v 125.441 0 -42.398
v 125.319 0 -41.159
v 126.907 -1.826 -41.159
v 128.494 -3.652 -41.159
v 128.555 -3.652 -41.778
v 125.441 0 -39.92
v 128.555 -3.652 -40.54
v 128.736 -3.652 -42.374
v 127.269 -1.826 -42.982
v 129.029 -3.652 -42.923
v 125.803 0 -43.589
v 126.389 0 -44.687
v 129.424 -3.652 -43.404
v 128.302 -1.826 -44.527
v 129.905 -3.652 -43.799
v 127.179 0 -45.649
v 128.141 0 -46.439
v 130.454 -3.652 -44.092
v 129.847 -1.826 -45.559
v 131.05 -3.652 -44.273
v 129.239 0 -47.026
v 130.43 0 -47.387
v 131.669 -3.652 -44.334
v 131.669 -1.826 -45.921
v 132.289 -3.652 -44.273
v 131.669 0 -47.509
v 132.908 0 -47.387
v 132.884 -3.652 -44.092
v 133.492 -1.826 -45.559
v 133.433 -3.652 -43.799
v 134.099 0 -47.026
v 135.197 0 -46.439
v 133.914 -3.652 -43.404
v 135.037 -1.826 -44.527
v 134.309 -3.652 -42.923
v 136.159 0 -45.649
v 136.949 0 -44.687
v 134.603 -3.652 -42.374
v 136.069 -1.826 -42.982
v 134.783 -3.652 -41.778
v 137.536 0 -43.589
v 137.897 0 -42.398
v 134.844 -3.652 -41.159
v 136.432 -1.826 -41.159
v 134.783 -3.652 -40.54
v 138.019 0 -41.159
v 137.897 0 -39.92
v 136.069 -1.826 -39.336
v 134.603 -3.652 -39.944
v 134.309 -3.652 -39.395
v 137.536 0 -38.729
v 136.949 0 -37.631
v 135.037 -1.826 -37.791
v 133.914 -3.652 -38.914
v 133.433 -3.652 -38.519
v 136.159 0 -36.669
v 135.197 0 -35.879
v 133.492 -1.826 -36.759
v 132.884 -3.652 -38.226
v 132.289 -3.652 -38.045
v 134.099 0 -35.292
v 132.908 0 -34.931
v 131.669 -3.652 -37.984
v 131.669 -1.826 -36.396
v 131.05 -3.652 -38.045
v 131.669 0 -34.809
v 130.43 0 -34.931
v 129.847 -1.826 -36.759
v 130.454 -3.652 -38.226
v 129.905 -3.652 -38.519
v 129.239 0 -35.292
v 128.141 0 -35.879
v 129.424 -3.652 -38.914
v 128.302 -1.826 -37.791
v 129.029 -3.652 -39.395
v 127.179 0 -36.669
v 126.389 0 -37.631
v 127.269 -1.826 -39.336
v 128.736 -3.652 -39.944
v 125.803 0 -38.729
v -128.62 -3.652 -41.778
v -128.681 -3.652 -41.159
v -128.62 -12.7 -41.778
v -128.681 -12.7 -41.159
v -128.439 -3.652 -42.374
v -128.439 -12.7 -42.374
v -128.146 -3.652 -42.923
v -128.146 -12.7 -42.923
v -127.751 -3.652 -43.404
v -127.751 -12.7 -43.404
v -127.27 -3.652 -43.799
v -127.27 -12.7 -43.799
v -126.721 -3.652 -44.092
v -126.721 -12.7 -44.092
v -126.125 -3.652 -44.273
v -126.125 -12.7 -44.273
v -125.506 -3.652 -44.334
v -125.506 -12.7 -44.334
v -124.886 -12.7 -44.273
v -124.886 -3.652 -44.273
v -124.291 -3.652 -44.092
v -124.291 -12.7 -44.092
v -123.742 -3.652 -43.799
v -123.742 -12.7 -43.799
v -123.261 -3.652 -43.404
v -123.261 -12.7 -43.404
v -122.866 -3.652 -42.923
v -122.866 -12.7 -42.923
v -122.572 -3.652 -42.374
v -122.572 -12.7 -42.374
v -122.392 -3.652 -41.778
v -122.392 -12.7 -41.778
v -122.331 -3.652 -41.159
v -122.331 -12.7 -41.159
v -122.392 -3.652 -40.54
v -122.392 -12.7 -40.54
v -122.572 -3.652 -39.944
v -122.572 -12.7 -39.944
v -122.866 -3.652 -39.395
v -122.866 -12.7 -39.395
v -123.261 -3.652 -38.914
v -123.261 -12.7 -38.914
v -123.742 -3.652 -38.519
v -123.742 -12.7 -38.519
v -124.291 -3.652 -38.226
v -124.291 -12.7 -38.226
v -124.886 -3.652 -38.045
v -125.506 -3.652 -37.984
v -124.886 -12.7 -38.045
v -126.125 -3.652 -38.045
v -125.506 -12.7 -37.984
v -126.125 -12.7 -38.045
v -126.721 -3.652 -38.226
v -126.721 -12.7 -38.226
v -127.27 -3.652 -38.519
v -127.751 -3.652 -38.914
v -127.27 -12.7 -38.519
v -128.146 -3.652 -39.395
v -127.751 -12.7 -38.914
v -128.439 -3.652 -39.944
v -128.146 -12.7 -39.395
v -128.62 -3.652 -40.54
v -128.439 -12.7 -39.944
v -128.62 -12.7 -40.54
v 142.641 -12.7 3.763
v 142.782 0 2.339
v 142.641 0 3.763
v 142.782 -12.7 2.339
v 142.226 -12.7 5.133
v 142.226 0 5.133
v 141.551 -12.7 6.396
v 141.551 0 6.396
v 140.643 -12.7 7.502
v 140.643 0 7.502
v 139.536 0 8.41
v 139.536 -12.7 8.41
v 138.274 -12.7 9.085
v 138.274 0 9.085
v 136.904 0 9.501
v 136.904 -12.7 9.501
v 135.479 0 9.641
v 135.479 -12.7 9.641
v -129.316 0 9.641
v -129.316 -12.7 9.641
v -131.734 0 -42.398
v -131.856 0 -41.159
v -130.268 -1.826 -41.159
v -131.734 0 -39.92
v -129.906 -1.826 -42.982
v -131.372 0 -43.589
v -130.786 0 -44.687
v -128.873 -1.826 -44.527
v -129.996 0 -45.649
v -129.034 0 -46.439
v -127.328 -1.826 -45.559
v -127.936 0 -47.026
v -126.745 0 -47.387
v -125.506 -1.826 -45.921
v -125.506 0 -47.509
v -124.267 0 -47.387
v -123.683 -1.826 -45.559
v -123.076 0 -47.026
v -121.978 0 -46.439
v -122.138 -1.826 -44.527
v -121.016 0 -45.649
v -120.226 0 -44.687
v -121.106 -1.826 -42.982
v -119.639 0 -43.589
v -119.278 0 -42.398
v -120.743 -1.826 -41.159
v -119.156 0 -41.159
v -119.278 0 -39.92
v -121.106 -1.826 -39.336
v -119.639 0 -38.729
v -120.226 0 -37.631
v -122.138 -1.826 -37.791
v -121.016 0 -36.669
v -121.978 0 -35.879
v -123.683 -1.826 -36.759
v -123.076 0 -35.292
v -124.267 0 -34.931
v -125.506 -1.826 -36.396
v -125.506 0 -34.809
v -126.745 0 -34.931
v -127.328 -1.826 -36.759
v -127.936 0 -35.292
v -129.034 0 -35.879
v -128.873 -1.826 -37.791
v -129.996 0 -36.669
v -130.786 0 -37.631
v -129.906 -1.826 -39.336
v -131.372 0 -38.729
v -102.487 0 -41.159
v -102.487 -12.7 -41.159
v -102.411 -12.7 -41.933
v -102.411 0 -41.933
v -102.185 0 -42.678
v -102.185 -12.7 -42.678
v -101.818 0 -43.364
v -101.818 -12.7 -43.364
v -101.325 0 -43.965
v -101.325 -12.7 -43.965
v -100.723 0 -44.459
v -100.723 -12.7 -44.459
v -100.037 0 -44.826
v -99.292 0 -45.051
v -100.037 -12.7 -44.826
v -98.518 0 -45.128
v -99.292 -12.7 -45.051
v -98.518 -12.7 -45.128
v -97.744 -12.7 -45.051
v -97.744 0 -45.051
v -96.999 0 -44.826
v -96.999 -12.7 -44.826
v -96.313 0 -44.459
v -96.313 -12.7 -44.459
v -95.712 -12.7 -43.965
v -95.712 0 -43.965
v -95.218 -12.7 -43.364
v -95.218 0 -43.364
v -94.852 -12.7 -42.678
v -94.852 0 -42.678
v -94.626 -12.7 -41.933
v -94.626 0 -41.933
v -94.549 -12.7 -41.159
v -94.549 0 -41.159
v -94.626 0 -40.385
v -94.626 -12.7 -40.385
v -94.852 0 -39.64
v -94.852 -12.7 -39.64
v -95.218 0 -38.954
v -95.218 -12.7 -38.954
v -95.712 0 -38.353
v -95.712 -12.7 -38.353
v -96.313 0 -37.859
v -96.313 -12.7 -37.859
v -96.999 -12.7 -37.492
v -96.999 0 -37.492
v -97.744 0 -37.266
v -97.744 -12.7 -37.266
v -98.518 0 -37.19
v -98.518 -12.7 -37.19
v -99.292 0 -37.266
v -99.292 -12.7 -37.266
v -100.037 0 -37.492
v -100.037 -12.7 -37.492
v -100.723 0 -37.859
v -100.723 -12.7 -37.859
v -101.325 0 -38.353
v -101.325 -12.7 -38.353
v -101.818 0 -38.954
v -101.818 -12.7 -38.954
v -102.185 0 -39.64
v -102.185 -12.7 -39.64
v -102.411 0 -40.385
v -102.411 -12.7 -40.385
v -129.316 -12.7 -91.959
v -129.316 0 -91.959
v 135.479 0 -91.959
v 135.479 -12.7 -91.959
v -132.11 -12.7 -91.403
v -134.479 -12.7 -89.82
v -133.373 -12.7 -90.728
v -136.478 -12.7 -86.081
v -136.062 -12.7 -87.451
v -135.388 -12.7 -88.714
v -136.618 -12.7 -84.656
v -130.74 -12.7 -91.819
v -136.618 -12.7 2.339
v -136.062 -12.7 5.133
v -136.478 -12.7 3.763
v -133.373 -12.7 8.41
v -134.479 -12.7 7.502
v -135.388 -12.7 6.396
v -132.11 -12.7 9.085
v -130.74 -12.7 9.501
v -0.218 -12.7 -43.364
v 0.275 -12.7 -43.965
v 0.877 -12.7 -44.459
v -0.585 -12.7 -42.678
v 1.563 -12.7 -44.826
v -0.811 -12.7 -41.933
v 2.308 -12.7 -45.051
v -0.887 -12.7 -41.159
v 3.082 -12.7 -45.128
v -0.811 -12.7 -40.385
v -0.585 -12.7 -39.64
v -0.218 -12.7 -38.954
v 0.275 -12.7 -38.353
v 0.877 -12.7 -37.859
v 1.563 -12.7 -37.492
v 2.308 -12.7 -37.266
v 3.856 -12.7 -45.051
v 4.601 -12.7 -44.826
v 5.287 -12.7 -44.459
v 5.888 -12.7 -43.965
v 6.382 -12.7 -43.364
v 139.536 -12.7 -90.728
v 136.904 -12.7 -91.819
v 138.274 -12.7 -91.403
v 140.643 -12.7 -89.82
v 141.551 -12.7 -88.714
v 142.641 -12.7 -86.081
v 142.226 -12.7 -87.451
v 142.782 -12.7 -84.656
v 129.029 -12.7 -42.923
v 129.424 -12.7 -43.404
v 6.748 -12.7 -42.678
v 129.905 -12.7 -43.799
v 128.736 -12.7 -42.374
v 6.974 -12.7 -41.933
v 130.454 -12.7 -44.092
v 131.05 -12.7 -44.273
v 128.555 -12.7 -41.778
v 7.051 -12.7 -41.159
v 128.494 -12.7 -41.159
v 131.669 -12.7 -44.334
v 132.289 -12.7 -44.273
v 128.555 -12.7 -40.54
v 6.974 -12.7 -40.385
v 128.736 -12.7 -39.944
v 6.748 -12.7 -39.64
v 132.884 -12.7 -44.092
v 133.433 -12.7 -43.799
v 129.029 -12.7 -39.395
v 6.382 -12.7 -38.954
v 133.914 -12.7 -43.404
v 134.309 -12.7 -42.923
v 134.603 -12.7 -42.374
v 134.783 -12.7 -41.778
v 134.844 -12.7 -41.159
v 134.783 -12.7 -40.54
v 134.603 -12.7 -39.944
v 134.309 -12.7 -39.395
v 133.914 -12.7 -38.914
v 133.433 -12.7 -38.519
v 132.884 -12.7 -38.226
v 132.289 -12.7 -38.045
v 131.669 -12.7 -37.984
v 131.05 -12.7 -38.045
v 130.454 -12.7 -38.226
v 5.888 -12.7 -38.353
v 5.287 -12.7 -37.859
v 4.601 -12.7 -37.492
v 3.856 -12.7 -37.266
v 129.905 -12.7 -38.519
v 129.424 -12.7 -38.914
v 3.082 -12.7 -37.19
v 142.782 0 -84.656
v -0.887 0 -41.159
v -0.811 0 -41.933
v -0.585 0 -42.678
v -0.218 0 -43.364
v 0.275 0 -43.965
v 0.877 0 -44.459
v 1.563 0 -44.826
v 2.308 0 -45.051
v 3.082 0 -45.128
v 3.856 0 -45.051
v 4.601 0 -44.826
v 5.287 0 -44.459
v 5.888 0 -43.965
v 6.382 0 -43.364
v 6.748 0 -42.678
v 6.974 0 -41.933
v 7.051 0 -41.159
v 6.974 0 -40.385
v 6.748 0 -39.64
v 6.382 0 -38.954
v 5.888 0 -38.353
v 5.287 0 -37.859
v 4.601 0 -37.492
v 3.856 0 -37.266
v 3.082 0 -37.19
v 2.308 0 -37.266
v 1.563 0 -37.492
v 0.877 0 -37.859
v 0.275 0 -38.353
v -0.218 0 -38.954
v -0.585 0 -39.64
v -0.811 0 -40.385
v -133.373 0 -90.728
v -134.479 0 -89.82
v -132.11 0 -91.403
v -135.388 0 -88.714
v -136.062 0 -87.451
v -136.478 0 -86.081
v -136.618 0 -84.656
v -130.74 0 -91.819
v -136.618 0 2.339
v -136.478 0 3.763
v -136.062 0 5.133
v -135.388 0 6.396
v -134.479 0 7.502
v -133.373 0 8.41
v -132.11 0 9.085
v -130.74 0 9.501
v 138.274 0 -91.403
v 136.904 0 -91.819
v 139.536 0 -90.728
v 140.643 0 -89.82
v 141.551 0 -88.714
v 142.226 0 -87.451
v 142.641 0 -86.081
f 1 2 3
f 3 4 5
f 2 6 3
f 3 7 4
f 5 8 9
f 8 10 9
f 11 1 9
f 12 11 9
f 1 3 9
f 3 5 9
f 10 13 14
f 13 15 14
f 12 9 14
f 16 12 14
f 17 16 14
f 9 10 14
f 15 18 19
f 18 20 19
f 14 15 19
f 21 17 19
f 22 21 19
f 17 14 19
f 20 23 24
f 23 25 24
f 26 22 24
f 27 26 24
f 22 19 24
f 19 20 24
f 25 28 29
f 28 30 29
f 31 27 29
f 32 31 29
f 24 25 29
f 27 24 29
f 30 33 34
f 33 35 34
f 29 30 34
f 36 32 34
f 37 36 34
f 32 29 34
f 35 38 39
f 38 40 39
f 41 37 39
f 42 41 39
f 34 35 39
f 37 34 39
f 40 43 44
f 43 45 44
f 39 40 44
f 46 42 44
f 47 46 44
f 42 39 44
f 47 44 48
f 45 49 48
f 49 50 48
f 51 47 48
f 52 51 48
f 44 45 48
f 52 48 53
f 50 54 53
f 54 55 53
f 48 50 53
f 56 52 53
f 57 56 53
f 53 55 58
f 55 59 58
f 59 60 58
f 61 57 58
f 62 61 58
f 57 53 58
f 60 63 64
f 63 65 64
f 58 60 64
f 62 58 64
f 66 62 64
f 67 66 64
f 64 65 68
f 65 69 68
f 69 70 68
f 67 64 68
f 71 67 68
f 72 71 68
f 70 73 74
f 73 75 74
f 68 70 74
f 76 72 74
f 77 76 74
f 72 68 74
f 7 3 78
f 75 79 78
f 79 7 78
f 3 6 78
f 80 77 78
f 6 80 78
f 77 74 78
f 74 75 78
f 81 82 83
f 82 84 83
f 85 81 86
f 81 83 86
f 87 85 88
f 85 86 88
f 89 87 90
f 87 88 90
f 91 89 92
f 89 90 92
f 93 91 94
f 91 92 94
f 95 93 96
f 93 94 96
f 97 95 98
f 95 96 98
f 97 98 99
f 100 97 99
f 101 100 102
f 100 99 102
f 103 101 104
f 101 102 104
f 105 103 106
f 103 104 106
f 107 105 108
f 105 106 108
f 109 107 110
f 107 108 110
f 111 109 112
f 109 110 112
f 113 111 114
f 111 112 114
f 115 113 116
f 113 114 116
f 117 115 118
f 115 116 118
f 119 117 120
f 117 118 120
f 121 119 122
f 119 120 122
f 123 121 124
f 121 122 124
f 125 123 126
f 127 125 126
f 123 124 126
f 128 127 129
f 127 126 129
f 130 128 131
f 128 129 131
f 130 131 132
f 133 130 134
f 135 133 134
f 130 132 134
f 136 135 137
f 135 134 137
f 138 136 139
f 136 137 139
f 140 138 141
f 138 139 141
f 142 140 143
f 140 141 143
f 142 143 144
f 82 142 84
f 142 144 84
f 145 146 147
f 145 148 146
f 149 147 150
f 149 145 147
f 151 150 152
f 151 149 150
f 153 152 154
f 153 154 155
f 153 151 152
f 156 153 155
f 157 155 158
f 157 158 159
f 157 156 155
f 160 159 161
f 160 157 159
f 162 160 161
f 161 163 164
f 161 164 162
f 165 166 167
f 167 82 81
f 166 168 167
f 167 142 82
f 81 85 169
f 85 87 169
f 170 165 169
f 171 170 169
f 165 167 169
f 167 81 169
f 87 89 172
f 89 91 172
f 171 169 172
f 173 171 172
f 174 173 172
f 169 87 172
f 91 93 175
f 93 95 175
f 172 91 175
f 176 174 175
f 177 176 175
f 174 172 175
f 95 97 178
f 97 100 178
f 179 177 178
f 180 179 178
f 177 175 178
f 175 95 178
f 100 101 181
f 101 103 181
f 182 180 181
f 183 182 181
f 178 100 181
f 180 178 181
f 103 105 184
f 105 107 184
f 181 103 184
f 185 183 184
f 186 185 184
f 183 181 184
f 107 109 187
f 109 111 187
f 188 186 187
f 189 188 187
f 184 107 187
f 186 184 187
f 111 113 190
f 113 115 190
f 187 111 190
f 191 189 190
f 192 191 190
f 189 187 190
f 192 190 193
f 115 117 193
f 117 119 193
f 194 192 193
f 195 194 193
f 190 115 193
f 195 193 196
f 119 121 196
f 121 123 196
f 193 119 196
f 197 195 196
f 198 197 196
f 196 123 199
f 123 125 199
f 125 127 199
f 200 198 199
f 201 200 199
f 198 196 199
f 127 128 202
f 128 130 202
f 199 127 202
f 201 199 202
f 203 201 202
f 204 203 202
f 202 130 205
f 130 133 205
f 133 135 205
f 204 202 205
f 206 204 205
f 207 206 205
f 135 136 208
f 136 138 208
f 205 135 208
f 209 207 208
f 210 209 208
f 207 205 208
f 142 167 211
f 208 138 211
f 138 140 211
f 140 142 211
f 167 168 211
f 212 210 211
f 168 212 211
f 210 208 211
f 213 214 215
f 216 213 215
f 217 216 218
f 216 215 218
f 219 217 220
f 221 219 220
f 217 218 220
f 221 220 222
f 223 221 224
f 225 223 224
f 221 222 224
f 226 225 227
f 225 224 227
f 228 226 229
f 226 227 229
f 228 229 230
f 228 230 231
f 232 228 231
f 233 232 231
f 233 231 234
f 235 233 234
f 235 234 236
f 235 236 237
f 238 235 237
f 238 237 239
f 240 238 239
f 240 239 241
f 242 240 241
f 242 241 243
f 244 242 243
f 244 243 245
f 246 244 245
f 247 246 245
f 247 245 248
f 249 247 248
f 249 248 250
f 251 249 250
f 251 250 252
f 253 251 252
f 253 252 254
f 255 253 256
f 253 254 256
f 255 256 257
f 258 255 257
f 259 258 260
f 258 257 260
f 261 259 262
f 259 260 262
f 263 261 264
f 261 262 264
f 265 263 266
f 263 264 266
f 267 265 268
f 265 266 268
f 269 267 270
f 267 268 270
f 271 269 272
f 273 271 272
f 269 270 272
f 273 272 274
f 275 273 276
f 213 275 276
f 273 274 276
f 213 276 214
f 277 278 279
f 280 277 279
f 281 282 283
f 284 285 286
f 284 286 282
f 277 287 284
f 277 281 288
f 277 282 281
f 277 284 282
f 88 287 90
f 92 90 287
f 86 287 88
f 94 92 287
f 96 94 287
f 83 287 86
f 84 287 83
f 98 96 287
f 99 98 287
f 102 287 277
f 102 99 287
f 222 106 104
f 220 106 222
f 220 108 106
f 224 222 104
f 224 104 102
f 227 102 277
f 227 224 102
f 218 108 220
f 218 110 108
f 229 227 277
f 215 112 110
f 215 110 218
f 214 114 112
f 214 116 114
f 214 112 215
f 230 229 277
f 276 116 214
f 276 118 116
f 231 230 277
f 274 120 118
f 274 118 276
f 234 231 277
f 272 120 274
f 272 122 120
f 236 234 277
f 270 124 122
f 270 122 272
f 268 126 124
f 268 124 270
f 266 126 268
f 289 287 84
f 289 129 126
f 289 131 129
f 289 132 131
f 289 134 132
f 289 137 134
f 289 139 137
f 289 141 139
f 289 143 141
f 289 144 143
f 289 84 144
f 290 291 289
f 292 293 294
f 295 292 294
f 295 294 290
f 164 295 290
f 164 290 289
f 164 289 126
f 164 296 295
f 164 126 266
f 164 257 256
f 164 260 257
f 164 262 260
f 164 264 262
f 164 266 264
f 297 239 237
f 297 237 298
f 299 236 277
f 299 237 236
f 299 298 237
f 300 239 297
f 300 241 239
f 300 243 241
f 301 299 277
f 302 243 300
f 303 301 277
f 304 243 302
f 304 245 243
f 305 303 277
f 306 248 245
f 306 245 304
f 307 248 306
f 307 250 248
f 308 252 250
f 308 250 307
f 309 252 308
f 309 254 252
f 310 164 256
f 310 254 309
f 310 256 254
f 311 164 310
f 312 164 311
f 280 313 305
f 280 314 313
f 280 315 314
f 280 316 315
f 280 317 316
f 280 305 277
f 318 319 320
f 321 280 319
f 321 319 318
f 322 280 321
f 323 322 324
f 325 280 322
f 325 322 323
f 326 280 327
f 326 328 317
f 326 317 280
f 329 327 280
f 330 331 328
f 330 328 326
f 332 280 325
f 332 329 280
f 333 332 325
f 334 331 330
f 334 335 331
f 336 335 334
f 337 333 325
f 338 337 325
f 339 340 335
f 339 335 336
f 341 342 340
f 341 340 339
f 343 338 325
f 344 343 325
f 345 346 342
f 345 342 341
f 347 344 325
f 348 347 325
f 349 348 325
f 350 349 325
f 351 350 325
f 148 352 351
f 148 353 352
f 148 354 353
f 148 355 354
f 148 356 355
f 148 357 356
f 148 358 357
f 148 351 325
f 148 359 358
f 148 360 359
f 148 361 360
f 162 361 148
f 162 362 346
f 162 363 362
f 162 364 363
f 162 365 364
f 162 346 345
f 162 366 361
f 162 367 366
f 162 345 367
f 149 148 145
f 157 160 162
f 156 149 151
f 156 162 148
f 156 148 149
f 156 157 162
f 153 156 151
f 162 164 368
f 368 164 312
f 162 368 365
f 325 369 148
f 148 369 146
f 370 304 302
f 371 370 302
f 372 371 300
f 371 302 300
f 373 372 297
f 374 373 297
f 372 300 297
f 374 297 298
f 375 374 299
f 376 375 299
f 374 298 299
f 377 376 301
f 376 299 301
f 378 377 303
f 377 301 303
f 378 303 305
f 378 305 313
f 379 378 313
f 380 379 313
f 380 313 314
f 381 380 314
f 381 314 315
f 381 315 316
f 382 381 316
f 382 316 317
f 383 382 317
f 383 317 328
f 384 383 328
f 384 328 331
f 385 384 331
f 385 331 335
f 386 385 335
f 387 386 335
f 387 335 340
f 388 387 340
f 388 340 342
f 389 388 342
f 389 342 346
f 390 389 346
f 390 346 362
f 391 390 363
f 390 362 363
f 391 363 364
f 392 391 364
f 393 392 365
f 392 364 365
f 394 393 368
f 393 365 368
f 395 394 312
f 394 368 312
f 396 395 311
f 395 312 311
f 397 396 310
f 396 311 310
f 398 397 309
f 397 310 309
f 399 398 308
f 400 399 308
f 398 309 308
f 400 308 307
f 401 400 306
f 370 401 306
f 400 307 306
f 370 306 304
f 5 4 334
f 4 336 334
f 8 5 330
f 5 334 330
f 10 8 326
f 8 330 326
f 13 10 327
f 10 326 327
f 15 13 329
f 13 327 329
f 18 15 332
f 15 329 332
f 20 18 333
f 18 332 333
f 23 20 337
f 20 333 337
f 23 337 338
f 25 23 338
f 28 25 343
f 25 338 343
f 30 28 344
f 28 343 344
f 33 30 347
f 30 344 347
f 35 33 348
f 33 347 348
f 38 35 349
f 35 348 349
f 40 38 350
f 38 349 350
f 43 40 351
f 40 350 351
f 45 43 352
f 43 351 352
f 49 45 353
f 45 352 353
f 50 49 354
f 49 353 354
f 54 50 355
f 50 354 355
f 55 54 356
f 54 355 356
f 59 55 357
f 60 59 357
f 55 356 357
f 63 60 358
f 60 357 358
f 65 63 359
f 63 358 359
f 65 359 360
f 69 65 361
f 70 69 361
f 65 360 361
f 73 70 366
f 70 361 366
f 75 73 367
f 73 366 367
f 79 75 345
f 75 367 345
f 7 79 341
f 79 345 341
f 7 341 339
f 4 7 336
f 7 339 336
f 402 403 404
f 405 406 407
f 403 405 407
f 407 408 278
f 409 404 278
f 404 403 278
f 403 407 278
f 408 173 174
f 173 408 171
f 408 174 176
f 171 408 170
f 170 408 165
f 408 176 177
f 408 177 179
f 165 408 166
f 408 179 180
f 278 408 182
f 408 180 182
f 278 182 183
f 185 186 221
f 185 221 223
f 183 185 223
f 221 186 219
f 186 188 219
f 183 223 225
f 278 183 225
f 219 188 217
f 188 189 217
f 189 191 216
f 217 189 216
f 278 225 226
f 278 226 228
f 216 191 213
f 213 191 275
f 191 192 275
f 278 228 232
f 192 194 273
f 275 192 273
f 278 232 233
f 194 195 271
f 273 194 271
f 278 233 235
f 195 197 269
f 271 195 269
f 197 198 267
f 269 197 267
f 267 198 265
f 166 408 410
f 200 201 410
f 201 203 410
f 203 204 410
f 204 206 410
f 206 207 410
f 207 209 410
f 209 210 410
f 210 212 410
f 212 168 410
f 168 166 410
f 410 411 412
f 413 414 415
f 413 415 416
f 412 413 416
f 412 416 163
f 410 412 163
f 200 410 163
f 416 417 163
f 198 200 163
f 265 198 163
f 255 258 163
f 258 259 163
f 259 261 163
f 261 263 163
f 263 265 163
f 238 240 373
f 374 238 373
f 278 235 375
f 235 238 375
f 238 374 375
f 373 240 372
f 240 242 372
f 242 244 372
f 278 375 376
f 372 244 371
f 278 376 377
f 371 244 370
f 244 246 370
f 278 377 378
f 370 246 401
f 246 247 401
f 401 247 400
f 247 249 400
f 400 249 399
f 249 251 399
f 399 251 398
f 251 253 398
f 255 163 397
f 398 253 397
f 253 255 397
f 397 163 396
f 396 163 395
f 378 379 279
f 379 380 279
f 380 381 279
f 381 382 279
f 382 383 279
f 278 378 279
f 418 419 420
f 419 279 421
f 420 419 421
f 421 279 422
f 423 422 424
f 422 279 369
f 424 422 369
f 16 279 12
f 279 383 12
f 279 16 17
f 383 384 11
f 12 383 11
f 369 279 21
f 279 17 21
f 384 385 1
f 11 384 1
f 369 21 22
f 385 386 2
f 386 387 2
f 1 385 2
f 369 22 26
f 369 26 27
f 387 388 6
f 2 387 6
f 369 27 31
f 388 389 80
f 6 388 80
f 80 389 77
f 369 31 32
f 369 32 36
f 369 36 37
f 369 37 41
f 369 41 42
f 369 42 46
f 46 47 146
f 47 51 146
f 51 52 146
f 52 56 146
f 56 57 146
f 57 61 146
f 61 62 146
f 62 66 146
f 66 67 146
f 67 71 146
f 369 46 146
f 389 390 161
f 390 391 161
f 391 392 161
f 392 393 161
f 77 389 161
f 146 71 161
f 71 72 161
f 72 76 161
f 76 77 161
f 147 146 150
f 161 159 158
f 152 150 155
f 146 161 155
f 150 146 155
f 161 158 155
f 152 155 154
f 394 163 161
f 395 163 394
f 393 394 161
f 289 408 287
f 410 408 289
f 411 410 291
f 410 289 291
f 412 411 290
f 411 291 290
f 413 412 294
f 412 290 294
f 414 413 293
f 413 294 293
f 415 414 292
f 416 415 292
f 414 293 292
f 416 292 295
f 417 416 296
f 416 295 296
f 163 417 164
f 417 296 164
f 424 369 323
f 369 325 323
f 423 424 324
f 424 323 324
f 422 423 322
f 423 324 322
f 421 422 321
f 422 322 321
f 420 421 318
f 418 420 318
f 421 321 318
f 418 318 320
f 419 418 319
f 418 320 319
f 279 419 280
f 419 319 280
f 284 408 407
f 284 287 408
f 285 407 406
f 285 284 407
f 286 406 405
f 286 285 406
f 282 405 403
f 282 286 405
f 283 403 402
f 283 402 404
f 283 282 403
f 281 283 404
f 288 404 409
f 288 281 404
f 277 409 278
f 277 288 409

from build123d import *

# Parameters (mm, degrees)
F0_W           = 279.4
F0_H           = 101.6
F1_DEPTH       = 12.7
F2_D           = 7.9375
F3_D           = 6.35
F3_CSINK_D     = 12.7
F3_CSINK_ANGLE = 82
F4_R           = 7.3025


with BuildPart() as f1:
    # F0 (on Front) → F1 (new body)
    with BuildSketch(Plane.XZ):
        with Locations((3.0817836523, -41.158976573)):
            Rectangle(F0_W, F0_H)
    extrude(amount=F1_DEPTH)

    # F2 (through all)
    with Locations(Plane(origin=(0, 0, 0), x_dir=(1, 0, 0), z_dir=(0, 1, 0))):
        with Locations((-98.5182163477, 41.158976573), (3.0817836523, 41.158976573)):
            Hole(F2_D / 2)

    # F3 (through all)
    with Locations(Plane(origin=(0, 0, 0), x_dir=(1, 0, 0), z_dir=(0, 1, 0))):
        with Locations((-125.5057163477, 41.158976573), (131.6692836523, 41.158976573)):
            CounterSinkHole(F3_D / 2, F3_CSINK_D / 2, counter_sink_angle=F3_CSINK_ANGLE)

    # F4
    f4_edges = [f1.edges().sort_by_distance(p)[0] for p in [
        (142.781784, -6.35, 9.641023),
        (-136.618216, -6.35, 9.641023),
        (-136.618216, -6.35, -91.958977),
        (142.781784, -6.35, -91.958977),
    ]]
    fillet(f4_edges, radius=F4_R)


solid = f1.part
